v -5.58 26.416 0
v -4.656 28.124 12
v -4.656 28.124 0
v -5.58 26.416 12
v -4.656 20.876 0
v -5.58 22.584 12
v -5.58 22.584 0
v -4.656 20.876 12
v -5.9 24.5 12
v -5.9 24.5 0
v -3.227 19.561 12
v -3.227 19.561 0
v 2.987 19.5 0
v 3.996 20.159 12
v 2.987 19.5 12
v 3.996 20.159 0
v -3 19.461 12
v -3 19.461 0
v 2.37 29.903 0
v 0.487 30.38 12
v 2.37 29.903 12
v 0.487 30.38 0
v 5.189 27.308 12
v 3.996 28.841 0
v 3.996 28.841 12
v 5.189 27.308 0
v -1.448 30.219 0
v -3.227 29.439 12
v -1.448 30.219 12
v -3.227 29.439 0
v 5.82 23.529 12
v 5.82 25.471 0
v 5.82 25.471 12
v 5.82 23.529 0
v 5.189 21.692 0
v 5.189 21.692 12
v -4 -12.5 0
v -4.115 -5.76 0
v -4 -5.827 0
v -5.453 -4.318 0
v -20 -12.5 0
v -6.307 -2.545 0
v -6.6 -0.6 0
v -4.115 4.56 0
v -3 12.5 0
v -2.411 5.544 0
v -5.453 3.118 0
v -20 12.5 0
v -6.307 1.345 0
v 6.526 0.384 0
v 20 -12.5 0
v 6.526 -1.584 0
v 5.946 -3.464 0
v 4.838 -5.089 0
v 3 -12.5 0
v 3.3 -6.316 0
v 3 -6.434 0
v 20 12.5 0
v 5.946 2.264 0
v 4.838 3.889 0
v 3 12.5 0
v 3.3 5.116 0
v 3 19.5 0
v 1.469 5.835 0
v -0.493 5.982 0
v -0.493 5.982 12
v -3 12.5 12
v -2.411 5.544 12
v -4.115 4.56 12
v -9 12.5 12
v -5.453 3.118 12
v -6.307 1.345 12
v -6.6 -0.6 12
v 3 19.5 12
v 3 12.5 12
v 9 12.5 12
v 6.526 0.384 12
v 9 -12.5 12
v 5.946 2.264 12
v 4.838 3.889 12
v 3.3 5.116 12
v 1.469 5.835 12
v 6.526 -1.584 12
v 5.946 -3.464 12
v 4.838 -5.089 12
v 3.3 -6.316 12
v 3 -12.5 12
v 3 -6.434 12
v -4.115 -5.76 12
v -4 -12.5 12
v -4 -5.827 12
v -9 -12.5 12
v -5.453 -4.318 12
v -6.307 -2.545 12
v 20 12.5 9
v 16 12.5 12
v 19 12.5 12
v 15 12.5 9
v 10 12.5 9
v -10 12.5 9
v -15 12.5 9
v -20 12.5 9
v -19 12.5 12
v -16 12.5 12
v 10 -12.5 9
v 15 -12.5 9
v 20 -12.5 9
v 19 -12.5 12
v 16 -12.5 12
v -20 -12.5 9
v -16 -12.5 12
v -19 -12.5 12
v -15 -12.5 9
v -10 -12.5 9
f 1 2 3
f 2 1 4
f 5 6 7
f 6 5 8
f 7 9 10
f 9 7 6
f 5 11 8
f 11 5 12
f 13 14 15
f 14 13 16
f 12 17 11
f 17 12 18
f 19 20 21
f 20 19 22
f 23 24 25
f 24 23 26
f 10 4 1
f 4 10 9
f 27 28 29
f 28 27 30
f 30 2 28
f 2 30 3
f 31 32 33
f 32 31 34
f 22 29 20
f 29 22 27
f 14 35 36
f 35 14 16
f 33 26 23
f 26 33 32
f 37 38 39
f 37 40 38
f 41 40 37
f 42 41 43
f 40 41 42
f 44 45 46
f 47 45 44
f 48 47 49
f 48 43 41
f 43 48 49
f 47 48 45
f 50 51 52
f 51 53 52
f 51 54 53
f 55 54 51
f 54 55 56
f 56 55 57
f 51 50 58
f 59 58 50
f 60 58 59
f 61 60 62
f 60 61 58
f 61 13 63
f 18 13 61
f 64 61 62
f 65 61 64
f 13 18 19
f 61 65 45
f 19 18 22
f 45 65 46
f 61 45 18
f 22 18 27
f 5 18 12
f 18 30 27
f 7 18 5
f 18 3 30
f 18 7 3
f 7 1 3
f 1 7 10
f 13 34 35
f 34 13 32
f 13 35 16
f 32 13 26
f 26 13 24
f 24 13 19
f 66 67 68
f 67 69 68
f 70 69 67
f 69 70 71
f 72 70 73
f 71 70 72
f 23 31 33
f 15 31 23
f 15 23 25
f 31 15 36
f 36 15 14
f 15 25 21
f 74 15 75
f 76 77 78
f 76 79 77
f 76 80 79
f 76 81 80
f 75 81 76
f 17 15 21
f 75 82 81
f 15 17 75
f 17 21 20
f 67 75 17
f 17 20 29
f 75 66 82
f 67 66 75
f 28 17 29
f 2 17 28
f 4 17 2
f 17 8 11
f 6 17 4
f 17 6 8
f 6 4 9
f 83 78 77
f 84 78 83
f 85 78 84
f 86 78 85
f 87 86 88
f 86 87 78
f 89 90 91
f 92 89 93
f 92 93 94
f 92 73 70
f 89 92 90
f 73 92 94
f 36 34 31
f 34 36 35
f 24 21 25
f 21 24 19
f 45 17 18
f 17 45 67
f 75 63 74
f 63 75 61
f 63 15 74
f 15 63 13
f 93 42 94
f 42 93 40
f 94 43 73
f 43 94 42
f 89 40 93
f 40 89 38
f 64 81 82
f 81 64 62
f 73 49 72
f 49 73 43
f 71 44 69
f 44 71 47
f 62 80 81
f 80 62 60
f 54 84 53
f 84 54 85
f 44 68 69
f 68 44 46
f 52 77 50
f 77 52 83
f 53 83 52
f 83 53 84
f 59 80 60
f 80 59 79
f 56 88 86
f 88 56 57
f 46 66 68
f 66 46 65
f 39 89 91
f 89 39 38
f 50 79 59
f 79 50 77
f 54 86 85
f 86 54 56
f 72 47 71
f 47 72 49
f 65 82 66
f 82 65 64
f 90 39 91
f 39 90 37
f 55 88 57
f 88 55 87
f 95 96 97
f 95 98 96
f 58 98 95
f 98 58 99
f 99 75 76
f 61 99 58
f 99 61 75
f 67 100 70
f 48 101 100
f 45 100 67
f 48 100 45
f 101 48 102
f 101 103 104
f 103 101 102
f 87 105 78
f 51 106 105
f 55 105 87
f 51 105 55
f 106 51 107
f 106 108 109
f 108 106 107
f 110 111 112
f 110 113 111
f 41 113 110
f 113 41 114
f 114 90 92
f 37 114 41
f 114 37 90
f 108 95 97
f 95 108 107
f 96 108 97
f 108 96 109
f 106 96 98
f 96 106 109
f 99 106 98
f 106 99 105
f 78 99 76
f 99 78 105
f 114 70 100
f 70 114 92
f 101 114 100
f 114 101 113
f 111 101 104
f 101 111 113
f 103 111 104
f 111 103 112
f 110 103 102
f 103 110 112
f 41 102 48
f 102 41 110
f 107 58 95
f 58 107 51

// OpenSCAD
//in mm. Minimum 40 for female-female
track_length=25;
track_option=2; // [1:male-male, 2:male-female, 3: female-female]

//track extrusion
module track(){
	translate([-20,0,0])
	rotate (a=[90,0,0]) linear_extrude(height =track_length, center = true) polygon(points = [ [0,0], [0,9], [1,12],[4,12],[5,9],[10,9],[11,12],[29,12],[30,9],[35,9],[36,12], [39,12],[40,9], [40,0]], path = [[0,1,2,3,4,5,6,7,8,9,10,11,12,13,14]]);
}

//peg male
module peg(){
	translate ([0,-12,0])
	union(){
		cylinder(12,5.9,5.9);
		translate ([-3,5,0]) cube(size=[6,8,12]);
	}
}

//peg cut female
module peg_cut(){
	translate ([0,-11.9,-1])
	union(){
		cylinder(14,6.6,6.6);
		translate ([-3,5,0]) cube(size=[7,8,14]);
	}
}

//male-male track
module mm_track (){
translate ([0,-track_length/2,0]) peg();
translate ([0,track_length/2,0]) rotate(a=[0,0,180]) peg();
track ();
}

//male-female track
module mf_track (){
	translate ([0,track_length/2,0]) rotate(a=[0,0,180]) peg();
	difference() {
		track();
		translate ([0,-track_length/2,0]) rotate(a=[0,0,180]) peg_cut();	
	}
}

//female-female track
module ff_track (){
	difference() {
		track();
		translate ([0,-track_length/2,0]) rotate(a=[0,0,180]) peg_cut();
		translate ([0,track_length/2,0])  peg_cut();	
	}
}
if (track_option==1) {
	mm_track();
}
if (track_option==2) {
	mf_track();
}
else
{
	ff_track();
}
